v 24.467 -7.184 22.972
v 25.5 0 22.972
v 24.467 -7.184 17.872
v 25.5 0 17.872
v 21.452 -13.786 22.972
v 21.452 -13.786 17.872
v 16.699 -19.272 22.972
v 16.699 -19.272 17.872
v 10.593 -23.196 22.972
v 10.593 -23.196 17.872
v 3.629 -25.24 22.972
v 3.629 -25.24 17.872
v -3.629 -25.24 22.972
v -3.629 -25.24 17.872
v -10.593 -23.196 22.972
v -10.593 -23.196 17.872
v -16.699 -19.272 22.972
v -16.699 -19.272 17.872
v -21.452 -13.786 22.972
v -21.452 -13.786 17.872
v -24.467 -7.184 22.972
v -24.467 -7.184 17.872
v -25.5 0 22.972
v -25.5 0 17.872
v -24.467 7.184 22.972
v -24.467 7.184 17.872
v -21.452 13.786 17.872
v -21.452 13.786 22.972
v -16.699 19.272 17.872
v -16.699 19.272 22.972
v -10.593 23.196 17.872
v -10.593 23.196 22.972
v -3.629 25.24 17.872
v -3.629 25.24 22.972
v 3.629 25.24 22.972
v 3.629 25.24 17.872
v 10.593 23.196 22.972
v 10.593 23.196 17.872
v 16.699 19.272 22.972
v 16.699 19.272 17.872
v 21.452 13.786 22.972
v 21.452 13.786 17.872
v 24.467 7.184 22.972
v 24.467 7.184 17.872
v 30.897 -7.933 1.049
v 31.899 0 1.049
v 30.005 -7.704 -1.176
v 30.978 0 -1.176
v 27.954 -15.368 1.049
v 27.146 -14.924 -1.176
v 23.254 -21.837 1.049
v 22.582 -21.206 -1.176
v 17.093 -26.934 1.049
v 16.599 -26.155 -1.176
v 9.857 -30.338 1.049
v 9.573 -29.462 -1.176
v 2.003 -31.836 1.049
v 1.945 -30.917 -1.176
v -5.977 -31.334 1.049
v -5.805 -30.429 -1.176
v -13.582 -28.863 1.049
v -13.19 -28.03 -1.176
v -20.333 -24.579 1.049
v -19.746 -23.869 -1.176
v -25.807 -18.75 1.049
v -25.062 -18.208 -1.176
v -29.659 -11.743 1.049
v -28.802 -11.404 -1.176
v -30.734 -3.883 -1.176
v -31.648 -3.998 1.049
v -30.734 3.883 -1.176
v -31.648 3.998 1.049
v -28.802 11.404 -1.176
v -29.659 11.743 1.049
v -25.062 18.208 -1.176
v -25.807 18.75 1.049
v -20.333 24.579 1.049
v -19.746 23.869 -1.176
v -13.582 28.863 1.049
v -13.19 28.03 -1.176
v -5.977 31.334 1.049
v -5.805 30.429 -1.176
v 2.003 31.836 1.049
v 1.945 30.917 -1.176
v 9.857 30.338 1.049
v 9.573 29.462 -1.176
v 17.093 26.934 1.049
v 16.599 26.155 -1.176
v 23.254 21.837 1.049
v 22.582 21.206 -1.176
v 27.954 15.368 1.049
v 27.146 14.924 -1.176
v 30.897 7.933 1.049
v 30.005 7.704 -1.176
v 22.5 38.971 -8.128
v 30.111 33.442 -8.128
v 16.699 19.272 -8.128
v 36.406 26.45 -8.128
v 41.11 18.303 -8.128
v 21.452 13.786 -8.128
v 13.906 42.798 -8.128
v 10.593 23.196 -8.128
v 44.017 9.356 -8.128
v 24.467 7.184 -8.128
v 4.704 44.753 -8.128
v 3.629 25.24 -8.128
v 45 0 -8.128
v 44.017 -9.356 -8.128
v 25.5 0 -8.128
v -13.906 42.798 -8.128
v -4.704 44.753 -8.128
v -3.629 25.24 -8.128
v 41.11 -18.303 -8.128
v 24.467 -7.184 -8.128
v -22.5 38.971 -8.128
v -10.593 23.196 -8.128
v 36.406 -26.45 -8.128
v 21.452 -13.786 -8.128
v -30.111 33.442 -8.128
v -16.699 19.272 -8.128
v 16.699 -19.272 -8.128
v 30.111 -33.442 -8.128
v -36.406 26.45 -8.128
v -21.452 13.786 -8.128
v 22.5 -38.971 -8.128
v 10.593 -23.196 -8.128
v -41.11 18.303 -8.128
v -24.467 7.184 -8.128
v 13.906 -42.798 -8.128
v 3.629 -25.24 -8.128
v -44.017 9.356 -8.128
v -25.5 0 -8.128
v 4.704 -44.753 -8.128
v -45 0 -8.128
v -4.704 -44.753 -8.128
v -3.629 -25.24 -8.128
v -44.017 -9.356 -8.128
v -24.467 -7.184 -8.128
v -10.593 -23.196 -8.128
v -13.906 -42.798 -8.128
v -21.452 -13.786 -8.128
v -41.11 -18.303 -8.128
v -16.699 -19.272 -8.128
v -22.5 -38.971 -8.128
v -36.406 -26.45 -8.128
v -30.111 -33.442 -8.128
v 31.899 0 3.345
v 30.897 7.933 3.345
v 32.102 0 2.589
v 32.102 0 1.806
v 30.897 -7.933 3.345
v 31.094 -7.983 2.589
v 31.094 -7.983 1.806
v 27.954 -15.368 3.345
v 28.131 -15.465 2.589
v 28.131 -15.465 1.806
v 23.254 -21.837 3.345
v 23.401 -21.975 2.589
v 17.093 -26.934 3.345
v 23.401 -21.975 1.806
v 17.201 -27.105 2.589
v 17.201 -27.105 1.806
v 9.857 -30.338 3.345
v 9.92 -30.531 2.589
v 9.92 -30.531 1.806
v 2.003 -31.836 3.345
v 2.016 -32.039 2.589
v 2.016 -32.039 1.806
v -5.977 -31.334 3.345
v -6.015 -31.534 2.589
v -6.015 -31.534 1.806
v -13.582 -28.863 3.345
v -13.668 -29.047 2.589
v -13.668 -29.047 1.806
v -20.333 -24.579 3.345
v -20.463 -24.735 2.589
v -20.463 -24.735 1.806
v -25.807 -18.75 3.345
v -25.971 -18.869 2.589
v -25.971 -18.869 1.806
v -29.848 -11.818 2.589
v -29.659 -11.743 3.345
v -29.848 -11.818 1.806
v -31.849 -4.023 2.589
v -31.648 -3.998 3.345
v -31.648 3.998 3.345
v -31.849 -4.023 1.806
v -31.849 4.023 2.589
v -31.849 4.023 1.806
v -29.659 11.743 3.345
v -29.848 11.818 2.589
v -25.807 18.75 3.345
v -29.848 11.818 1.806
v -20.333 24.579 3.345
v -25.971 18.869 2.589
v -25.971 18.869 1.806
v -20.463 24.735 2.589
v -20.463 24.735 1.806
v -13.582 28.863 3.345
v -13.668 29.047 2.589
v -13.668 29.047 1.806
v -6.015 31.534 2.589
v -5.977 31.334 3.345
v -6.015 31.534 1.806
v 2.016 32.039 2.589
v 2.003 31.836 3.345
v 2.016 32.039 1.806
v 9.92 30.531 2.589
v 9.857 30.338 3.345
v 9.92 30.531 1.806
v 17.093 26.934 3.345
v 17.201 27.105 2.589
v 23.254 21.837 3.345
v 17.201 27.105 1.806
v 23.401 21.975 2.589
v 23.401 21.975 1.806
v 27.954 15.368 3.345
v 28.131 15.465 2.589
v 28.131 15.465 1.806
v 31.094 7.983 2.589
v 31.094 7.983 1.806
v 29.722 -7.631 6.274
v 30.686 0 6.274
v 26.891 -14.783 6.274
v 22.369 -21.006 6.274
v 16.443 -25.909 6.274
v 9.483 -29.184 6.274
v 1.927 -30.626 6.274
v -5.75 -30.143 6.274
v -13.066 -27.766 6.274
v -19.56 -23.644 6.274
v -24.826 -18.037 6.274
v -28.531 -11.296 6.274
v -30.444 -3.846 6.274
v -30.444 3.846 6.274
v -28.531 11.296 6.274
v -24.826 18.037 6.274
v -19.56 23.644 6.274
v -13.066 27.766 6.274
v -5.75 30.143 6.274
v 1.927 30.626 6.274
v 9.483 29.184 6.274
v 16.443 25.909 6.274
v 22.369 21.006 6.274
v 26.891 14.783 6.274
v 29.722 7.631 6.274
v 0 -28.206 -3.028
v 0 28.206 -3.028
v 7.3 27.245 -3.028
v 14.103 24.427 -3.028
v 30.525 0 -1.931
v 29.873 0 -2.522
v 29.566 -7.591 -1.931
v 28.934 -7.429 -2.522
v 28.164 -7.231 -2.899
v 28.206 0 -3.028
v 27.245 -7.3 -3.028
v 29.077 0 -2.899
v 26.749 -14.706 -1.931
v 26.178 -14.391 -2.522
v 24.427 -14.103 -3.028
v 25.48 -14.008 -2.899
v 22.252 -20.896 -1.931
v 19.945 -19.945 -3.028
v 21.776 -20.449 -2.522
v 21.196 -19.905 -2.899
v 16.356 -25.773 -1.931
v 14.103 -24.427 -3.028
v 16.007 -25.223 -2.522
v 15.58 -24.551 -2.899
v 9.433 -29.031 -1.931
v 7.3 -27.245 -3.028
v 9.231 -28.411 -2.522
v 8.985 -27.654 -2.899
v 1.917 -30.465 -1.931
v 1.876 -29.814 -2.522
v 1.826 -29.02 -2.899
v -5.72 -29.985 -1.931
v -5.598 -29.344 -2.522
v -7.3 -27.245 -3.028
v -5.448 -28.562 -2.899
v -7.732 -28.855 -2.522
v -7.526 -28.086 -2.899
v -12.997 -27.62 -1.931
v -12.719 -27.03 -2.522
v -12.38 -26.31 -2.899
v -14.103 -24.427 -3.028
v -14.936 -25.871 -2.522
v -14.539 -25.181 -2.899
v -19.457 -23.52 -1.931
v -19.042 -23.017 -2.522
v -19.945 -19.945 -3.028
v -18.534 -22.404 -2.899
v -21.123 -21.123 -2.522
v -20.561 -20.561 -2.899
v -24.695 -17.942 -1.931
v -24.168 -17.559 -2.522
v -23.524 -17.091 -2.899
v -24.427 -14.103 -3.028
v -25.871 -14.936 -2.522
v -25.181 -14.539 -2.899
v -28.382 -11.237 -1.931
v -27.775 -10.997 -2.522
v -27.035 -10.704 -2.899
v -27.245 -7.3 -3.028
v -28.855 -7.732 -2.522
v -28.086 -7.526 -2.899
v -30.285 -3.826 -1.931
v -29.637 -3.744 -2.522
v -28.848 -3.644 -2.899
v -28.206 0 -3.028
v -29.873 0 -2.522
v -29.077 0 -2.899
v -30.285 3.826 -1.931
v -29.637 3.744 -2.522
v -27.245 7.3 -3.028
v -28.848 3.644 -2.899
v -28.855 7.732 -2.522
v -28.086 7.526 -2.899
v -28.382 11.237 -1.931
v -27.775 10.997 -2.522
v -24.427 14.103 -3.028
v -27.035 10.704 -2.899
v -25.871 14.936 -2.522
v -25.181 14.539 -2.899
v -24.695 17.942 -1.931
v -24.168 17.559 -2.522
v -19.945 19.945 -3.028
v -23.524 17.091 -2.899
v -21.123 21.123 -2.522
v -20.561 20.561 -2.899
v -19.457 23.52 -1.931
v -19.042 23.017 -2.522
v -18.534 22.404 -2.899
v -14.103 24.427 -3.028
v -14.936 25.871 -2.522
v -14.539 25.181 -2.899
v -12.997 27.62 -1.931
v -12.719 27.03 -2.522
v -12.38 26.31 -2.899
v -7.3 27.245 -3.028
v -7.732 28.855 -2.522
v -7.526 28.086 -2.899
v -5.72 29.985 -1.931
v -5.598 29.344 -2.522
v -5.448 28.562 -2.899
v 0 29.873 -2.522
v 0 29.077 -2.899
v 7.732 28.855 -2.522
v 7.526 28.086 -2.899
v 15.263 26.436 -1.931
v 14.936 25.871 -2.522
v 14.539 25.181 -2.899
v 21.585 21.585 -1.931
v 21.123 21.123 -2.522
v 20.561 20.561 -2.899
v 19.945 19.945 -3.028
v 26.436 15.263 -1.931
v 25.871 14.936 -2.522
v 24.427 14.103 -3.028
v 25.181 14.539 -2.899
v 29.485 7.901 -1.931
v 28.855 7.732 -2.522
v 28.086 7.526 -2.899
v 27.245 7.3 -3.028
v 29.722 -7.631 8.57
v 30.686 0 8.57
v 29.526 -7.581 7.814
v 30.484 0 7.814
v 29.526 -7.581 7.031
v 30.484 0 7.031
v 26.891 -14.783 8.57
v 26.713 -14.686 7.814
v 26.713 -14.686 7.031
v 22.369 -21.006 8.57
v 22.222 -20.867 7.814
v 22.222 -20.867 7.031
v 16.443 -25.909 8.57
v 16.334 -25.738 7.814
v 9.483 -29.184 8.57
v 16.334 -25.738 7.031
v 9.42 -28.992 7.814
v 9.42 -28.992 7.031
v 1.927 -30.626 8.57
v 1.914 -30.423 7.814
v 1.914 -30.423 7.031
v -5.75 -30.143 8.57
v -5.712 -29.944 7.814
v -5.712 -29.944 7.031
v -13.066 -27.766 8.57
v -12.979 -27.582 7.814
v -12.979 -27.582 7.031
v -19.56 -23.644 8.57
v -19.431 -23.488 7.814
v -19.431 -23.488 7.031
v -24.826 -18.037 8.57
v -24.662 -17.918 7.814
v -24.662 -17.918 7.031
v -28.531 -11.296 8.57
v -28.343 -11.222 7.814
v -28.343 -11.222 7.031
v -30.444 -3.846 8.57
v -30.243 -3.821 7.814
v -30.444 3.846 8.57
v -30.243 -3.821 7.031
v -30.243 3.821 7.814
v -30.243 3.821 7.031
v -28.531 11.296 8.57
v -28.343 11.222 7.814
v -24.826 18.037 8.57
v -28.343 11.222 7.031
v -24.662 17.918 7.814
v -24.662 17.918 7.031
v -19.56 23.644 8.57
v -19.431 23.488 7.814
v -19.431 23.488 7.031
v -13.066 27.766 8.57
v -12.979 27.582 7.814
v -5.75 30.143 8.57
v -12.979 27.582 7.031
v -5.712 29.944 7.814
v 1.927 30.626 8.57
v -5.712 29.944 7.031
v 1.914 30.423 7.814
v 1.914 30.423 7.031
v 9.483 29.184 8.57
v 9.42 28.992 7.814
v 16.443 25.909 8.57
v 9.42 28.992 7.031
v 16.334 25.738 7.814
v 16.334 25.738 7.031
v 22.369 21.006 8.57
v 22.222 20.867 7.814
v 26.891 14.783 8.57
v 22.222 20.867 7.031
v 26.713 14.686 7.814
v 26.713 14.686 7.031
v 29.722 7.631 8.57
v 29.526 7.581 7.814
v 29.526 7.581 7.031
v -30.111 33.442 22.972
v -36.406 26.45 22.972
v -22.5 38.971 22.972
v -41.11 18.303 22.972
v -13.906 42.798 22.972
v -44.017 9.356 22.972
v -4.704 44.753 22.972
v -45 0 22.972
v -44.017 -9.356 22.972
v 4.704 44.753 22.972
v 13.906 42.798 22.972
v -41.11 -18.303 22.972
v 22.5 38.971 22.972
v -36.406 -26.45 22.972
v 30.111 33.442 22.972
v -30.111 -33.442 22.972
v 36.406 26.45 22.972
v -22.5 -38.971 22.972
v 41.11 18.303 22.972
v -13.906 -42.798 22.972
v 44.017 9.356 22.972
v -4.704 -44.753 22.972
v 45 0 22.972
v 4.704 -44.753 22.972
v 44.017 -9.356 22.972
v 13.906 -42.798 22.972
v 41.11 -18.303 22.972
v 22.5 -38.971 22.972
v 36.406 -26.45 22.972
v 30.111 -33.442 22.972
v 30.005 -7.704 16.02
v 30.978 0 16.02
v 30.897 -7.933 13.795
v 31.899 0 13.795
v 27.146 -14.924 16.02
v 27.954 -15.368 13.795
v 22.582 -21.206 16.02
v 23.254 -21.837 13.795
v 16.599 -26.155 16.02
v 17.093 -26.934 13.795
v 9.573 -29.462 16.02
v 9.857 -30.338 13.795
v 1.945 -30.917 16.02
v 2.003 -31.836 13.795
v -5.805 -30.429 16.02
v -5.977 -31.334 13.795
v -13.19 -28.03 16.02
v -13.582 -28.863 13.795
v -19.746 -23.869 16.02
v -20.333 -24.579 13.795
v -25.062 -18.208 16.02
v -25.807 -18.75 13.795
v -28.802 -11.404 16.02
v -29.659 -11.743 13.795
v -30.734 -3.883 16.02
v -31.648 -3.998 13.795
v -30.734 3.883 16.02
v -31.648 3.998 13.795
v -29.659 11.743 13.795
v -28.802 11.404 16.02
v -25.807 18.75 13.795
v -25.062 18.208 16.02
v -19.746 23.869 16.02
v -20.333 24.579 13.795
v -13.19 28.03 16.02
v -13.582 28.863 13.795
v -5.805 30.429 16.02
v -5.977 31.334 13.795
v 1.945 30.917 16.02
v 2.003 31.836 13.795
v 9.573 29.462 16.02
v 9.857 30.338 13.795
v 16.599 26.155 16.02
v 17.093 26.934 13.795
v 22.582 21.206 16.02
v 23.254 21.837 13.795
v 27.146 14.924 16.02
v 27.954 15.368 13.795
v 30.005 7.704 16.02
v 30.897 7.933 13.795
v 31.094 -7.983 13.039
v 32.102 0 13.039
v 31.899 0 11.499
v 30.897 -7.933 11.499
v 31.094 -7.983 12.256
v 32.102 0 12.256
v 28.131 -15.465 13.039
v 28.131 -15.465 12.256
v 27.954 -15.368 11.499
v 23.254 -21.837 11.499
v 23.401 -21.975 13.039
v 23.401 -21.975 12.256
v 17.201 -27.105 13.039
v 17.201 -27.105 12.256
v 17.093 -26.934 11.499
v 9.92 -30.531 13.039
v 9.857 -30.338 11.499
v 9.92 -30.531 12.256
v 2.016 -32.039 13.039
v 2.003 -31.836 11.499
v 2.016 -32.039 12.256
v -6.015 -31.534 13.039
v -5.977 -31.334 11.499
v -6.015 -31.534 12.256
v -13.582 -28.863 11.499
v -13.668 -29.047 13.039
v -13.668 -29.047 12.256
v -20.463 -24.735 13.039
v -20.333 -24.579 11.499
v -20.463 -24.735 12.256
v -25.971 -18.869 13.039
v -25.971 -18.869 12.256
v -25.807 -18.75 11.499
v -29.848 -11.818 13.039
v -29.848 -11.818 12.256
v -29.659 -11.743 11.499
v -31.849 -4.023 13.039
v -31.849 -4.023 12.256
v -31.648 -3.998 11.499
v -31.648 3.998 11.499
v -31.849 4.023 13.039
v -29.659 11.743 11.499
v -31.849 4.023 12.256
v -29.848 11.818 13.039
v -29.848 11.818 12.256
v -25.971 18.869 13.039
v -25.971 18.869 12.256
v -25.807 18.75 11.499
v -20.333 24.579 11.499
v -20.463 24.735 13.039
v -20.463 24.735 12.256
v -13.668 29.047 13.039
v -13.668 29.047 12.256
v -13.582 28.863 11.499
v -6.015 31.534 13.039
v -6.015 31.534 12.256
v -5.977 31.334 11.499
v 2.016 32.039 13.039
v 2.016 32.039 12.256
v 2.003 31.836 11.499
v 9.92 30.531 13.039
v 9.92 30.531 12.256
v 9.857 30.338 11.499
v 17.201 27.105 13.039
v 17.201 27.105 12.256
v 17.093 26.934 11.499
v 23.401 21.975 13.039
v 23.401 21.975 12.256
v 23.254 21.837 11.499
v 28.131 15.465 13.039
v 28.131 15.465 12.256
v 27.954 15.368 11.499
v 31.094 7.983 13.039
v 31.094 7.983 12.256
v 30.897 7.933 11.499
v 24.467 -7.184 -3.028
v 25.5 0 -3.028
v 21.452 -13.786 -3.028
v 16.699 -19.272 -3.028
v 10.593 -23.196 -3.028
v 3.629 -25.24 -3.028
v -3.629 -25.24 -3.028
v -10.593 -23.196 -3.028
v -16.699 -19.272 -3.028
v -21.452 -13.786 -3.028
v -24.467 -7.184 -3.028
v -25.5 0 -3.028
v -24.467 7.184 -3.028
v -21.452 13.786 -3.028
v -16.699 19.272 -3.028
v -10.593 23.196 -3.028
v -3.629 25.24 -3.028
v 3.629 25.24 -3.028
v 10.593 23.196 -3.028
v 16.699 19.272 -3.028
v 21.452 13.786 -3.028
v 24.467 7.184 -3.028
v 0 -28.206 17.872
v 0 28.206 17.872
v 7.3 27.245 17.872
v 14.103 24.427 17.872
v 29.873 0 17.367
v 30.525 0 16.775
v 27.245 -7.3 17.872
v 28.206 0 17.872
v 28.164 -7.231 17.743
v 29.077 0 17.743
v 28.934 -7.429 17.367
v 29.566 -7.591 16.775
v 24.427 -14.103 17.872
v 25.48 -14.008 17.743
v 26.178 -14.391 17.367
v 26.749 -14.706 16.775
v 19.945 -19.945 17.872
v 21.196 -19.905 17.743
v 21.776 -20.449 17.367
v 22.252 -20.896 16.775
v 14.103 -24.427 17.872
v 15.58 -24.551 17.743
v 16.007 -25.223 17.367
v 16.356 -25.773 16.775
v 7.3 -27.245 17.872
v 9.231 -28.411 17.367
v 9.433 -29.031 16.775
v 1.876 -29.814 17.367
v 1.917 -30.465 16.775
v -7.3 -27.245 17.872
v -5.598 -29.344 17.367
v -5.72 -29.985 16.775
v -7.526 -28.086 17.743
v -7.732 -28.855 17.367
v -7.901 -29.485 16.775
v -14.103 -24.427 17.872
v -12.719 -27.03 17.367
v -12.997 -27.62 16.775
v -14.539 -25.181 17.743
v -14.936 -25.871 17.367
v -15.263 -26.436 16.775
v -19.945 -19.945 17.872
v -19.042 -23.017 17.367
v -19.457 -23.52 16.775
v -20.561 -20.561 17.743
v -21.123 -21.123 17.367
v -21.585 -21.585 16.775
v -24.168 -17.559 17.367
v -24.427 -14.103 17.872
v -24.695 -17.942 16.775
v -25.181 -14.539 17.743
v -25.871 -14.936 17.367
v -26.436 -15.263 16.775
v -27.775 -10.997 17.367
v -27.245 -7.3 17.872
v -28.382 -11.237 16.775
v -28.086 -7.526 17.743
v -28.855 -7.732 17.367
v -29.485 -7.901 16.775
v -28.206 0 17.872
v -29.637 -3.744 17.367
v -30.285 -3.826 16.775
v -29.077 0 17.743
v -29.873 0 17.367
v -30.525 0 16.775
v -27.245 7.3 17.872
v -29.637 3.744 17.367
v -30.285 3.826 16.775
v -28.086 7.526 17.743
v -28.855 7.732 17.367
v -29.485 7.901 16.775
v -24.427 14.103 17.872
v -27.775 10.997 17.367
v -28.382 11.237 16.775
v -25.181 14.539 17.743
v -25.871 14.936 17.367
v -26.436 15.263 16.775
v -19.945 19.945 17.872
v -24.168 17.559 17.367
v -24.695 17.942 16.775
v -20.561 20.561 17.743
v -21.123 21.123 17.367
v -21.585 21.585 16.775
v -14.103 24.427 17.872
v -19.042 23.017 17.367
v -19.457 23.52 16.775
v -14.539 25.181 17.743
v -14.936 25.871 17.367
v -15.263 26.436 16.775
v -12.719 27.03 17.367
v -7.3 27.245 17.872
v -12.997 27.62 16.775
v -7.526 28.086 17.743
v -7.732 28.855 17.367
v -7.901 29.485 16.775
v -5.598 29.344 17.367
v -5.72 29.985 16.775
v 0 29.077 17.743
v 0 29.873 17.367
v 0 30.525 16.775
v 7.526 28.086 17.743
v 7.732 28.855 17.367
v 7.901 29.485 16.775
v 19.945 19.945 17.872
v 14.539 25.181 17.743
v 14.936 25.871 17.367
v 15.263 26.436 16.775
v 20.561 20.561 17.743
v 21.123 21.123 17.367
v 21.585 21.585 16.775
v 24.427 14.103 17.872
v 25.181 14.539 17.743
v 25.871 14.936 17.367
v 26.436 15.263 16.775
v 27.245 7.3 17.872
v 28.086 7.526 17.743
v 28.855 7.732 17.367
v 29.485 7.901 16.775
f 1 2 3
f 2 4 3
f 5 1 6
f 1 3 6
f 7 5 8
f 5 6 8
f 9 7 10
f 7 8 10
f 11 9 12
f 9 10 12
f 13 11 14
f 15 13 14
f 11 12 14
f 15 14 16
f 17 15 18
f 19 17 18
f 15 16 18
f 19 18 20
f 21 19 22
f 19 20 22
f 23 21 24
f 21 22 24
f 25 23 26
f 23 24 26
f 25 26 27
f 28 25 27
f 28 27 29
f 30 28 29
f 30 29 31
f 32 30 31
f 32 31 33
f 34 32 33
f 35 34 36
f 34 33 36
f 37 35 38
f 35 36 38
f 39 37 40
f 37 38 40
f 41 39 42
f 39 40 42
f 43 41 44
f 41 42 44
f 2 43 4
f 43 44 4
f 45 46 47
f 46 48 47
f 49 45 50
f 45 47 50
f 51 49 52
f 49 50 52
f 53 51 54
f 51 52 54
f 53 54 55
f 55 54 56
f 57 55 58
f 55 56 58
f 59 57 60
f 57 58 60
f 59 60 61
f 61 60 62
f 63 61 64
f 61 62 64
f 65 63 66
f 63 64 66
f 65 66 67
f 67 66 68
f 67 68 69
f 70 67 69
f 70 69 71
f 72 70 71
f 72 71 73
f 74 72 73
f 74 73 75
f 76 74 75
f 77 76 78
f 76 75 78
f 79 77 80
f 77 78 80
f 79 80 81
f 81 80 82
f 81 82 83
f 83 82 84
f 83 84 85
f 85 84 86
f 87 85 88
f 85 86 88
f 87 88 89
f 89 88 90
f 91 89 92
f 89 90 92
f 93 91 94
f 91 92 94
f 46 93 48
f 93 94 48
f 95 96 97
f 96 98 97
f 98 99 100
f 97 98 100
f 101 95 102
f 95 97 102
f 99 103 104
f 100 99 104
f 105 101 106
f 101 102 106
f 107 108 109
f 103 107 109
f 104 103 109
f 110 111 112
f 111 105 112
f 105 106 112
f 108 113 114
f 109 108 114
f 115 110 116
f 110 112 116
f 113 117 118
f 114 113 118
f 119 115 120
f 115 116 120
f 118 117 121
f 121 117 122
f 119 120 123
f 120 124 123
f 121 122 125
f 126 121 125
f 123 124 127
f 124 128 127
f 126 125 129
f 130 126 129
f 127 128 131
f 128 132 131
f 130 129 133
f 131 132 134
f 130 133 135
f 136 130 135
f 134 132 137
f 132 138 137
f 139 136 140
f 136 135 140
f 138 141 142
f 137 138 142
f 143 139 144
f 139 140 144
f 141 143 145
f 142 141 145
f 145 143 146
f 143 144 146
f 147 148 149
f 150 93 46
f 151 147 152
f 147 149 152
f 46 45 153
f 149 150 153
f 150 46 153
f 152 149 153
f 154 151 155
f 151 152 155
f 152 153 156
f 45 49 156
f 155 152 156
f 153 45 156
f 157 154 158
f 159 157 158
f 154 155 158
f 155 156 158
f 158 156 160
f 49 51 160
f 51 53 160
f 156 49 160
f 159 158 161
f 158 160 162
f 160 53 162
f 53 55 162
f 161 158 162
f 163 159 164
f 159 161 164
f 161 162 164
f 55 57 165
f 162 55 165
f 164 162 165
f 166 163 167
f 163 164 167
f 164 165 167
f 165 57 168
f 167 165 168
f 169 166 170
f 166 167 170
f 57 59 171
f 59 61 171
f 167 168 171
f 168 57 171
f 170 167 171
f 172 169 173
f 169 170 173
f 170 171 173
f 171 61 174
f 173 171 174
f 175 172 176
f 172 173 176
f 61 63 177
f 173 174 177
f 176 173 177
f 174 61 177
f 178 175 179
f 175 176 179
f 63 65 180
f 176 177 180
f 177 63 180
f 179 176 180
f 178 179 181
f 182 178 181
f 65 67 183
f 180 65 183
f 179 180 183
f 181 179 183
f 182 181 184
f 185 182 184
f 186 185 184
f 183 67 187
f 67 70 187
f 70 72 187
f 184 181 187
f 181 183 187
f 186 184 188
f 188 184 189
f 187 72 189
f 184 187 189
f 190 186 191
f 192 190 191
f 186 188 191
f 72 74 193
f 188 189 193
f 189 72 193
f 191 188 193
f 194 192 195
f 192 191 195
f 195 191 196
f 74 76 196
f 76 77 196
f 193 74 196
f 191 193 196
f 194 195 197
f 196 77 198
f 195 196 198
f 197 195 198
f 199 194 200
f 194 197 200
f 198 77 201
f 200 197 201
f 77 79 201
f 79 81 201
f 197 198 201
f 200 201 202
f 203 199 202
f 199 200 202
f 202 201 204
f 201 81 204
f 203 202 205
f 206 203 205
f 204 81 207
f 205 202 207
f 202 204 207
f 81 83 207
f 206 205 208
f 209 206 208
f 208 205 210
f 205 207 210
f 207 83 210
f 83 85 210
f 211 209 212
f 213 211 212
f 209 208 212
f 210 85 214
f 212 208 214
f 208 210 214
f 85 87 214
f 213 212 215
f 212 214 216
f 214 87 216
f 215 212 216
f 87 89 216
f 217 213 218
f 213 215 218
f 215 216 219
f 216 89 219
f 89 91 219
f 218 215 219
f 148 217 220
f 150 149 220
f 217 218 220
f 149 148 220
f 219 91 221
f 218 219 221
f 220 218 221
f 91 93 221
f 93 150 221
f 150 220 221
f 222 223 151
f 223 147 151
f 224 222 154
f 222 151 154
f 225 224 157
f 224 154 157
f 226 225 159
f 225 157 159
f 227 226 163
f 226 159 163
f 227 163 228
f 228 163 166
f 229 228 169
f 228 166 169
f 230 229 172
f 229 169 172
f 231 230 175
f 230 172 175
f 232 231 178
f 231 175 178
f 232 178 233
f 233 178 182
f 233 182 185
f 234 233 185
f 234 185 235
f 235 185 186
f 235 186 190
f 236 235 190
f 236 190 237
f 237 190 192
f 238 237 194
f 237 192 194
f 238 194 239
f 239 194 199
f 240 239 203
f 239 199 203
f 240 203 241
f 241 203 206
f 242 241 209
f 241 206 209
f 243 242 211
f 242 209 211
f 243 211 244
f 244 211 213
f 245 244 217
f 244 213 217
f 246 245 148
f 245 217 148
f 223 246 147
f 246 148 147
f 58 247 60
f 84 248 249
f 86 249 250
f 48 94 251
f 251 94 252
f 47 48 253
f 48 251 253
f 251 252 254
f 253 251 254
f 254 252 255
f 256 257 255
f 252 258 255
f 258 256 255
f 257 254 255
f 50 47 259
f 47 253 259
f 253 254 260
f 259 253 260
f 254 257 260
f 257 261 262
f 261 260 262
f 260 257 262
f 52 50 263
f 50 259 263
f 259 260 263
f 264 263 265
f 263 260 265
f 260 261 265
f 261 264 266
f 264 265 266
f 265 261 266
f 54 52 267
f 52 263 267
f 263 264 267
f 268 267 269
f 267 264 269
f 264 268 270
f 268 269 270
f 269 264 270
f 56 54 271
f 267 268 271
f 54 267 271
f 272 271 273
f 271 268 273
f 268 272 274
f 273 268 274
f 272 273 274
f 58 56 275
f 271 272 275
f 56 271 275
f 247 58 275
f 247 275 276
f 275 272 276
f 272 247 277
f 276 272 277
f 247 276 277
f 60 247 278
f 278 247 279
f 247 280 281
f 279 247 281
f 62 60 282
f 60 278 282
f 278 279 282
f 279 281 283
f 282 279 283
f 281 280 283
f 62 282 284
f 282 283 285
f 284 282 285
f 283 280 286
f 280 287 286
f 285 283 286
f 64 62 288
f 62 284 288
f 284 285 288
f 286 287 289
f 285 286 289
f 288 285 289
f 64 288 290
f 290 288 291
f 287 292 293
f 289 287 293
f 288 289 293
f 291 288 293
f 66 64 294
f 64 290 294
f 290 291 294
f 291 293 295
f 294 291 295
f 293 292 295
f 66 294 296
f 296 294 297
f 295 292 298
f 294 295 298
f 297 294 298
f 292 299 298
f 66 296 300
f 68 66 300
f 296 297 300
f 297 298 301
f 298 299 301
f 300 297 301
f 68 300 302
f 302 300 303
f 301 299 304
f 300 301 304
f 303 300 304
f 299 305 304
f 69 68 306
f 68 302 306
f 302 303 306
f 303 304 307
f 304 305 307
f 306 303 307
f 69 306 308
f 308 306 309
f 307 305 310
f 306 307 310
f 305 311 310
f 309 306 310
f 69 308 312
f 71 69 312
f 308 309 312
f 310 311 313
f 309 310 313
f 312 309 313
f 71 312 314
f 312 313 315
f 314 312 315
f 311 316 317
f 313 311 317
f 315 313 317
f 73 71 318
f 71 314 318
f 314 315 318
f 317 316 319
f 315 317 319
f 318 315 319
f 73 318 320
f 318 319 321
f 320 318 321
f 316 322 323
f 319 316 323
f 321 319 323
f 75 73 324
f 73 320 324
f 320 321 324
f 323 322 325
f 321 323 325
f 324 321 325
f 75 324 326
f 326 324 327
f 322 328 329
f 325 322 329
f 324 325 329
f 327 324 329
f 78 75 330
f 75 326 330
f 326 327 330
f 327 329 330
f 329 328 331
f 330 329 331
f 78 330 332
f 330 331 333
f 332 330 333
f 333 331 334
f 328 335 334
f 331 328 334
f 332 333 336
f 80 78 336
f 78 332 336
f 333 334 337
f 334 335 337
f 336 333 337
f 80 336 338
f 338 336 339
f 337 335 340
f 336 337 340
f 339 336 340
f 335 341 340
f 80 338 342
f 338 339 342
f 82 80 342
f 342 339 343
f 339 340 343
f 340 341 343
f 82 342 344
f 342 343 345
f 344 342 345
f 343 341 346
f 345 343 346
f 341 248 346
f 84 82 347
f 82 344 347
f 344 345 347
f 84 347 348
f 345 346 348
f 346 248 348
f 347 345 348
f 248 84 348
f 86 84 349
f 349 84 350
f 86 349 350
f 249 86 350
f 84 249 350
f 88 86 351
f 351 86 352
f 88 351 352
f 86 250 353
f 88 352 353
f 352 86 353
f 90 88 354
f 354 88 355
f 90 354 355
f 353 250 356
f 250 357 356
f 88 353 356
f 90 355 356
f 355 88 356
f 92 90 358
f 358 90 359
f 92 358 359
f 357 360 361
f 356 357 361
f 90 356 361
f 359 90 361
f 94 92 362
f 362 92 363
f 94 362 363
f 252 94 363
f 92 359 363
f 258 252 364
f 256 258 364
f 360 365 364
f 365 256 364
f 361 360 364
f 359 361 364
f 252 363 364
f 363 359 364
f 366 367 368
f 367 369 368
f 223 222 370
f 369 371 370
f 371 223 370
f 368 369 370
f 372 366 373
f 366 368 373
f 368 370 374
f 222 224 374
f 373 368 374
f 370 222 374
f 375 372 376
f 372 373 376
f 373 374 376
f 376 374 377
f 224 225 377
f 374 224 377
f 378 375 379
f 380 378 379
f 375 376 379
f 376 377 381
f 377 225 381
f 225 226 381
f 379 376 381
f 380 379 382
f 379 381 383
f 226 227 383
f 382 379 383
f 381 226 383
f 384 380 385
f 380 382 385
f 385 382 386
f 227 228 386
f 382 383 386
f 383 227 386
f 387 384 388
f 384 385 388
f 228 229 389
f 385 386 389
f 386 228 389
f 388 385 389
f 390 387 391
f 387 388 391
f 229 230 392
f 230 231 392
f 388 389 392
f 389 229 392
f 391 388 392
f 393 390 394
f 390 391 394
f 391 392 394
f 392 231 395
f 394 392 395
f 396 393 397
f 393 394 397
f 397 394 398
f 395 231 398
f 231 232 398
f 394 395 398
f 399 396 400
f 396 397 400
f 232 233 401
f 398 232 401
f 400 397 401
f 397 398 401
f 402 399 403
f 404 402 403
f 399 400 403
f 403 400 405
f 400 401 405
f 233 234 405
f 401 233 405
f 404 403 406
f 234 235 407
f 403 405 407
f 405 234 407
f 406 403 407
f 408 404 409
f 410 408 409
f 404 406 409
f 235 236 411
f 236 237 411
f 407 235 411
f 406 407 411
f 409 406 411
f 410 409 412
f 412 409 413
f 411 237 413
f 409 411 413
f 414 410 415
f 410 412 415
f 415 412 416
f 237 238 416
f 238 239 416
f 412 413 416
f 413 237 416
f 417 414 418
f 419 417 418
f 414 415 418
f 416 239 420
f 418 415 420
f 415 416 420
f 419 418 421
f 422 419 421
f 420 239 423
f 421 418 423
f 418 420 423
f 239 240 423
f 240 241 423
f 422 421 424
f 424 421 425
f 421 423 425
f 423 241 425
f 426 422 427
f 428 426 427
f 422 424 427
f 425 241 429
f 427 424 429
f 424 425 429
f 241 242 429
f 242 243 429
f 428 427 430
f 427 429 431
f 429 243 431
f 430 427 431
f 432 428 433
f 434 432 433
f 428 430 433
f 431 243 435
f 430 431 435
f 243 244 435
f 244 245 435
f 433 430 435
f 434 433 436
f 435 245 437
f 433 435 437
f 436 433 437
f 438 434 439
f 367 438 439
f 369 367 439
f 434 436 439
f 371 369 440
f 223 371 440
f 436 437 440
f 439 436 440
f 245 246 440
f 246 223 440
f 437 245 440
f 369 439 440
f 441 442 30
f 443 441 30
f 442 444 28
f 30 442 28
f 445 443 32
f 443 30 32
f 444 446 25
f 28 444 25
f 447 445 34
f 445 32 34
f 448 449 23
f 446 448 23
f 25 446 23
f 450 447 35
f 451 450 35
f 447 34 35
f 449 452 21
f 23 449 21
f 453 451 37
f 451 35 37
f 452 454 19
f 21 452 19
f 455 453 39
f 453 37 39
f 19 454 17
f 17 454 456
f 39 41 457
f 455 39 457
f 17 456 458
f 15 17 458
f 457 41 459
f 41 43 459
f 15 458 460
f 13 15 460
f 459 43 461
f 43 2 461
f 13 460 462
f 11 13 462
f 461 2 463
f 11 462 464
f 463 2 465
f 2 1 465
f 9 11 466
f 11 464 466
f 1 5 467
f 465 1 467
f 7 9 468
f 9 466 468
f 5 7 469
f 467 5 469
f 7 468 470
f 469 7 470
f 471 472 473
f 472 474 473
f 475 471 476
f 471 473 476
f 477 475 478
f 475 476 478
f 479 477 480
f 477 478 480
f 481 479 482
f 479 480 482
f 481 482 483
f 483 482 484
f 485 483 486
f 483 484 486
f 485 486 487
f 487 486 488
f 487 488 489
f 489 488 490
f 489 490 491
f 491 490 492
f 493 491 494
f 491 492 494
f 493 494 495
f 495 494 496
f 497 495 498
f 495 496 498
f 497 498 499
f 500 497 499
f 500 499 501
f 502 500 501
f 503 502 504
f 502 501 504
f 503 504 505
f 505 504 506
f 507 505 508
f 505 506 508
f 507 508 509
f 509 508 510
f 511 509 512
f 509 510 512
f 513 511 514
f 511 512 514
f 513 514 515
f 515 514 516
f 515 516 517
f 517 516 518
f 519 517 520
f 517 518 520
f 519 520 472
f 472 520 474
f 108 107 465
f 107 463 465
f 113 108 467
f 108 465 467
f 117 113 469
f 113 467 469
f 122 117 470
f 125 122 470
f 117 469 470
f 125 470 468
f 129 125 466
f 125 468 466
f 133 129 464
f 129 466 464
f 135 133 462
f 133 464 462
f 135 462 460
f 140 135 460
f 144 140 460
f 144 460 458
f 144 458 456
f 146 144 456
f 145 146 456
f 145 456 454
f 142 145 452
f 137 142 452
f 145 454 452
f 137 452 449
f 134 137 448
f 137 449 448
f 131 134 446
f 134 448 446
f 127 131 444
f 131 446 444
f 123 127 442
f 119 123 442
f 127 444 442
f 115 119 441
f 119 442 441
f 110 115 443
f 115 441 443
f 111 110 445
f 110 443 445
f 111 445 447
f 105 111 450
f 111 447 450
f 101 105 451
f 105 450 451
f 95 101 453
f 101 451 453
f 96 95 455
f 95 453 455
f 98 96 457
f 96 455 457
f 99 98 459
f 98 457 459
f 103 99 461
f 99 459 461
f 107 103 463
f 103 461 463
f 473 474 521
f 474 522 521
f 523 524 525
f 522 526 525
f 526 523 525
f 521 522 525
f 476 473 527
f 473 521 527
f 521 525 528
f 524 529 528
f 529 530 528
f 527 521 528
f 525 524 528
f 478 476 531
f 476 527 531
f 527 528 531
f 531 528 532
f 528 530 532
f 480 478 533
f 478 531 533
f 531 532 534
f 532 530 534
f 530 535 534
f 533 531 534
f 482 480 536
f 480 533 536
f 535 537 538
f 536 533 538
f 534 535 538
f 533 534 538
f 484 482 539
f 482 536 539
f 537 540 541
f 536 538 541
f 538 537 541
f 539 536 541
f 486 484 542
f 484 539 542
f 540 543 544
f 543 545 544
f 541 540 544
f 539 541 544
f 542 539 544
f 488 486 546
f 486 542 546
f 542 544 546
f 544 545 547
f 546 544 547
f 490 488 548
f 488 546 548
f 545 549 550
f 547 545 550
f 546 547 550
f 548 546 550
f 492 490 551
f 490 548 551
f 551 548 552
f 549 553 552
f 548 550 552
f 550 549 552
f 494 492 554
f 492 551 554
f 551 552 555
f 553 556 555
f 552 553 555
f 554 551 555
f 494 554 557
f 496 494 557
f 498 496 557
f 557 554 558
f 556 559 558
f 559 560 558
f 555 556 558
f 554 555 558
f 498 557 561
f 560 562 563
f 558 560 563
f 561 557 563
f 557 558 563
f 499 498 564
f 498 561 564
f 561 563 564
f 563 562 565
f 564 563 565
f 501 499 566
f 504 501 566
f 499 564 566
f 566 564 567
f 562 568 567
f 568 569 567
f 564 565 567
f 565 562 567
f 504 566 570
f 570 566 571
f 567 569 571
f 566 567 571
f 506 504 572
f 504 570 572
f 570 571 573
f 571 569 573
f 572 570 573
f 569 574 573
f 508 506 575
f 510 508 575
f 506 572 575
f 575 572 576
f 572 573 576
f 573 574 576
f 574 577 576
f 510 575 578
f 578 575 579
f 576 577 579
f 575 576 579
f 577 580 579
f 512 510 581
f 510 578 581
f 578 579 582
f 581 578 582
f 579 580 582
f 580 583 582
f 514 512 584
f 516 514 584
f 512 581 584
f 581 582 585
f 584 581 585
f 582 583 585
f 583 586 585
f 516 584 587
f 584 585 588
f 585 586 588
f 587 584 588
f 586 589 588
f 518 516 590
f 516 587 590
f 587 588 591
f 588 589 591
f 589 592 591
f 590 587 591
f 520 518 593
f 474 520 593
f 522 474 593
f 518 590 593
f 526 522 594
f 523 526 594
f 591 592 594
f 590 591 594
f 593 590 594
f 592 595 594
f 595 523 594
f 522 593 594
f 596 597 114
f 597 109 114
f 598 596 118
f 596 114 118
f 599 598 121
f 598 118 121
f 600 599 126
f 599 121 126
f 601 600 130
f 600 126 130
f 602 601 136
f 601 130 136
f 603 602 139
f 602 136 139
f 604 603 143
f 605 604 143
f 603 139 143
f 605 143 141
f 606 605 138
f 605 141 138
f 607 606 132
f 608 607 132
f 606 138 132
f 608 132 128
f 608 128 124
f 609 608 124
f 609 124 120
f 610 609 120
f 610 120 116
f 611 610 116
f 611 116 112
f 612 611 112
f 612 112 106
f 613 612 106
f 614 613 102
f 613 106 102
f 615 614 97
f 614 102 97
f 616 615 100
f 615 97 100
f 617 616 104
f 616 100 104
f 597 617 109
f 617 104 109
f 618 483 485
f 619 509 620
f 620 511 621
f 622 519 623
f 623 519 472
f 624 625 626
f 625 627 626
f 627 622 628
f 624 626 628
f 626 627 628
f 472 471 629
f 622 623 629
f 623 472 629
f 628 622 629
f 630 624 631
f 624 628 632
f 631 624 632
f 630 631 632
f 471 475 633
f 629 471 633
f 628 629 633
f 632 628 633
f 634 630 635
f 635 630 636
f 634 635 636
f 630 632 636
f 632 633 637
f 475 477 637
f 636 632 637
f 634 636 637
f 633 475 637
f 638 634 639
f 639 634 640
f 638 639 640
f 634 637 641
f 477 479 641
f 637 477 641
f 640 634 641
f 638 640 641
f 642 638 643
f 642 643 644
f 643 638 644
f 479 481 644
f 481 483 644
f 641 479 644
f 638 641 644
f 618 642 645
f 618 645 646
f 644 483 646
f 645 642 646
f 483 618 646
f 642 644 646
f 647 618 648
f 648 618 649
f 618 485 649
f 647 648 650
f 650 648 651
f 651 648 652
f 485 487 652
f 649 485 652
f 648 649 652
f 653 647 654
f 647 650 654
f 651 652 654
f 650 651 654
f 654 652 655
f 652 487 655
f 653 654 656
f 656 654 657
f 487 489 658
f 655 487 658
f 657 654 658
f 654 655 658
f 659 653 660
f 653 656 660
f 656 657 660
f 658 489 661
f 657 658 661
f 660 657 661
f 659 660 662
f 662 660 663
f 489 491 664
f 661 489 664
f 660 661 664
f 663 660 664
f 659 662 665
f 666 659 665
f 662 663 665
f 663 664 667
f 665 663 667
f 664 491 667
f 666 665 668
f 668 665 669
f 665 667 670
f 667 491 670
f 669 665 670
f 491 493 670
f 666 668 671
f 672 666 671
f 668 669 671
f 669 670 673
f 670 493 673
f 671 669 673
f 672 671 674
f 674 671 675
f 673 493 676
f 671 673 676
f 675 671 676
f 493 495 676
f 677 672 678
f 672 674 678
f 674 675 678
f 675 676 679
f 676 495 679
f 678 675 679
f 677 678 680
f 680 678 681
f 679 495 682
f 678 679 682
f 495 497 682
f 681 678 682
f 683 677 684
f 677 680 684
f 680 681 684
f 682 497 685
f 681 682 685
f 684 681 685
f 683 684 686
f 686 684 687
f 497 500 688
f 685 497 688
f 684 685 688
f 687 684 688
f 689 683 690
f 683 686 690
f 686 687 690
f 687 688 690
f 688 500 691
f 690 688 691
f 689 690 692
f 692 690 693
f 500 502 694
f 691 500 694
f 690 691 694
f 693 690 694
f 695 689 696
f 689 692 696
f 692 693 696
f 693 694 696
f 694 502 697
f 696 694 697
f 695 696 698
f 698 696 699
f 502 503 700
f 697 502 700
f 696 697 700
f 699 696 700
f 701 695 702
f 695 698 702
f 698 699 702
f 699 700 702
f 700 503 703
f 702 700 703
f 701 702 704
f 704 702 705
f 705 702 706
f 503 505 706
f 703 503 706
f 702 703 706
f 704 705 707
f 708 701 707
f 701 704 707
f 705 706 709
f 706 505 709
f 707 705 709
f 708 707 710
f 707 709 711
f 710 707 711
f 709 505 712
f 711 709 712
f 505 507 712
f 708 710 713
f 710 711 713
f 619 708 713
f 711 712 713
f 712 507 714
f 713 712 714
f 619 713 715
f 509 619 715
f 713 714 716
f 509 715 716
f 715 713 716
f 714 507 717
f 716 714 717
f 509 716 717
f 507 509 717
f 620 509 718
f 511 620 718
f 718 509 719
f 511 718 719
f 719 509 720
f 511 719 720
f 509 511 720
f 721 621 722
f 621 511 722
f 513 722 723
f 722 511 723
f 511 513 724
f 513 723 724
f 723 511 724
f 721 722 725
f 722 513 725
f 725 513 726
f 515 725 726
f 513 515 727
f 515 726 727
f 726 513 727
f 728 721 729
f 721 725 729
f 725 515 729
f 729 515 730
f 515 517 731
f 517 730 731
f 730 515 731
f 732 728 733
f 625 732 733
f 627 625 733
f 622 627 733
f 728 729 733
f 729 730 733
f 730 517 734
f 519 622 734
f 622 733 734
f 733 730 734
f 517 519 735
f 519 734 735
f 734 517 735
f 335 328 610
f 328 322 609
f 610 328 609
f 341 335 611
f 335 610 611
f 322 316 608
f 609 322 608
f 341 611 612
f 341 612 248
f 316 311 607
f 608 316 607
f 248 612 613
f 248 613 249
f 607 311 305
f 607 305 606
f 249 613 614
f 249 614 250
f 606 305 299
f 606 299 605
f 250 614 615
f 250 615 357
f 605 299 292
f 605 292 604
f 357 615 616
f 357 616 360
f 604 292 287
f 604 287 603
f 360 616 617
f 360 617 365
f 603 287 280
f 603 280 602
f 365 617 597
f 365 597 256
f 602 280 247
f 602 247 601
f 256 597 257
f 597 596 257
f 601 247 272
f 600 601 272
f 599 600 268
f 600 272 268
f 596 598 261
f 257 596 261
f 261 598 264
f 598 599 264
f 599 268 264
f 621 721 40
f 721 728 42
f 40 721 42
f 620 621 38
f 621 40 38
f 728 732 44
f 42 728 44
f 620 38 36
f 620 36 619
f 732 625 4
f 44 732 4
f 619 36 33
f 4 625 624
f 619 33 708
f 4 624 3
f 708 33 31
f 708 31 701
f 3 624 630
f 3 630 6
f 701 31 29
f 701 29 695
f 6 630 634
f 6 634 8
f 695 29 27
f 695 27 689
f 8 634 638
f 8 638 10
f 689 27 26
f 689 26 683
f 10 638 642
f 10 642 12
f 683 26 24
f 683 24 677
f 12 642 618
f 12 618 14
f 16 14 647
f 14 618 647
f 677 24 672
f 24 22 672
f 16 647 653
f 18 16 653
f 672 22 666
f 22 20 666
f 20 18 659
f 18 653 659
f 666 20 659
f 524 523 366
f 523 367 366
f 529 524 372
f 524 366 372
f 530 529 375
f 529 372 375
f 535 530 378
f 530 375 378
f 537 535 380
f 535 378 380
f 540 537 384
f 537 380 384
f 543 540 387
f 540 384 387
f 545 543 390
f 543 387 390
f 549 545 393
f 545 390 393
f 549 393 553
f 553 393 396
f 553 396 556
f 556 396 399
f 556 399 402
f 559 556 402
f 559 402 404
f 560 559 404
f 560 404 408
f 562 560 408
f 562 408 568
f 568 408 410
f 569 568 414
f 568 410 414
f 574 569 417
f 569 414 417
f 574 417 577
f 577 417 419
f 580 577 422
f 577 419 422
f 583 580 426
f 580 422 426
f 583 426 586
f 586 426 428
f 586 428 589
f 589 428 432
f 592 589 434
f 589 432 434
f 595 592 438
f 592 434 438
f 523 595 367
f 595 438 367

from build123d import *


with BuildPart() as f1:
    # F0 (on Front) → F1 (revolve)
    with BuildSketch(Plane.XZ):
        with BuildLine():
            Line((45, 22.972104), (25.5, 22.972104))
            Line((25.5, 22.972104), (25.5, 17.872104))
            Line((25.5, 17.872104), (28.206175, 17.872104))
            ThreePointArc((28.206175, 17.872104), (29.872886, 17.366513), (30.977813, 16.020154))
            Line((30.977813, 16.020154), (31.899439, 13.795154))
            ThreePointArc((31.899439, 13.795154), (32.1278, 12.647104), (31.899439, 11.499054))
            Line((31.899439, 11.499054), (30.686249, 8.570154))
            ThreePointArc((30.686249, 8.570154), (30.457887, 7.422104), (30.686249, 6.274054))
            Line((30.686249, 6.274054), (31.899439, 3.345154))
            ThreePointArc((31.899439, 3.345154), (32.1278, 2.197104), (31.899439, 1.049054))
            Line((31.899439, 1.049054), (30.977813, -1.175946))
            ThreePointArc((30.977813, -1.175946), (29.872886, -2.522305), (28.206175, -3.027896))
            Line((28.206175, -3.027896), (27.959198, -3.027896))
            Line((27.959198, -3.027896), (25.5, -3.027896))
            Line((25.5, -3.027896), (25.5, -8.127896))
            Line((25.5, -8.127896), (45, -8.127896))
            Line((45, -8.127896), (45, 22.972104))
        make_face()
    revolve(axis=Axis((0, 0, 7.422104), (0, 0, -1)))


solid = f1.part
